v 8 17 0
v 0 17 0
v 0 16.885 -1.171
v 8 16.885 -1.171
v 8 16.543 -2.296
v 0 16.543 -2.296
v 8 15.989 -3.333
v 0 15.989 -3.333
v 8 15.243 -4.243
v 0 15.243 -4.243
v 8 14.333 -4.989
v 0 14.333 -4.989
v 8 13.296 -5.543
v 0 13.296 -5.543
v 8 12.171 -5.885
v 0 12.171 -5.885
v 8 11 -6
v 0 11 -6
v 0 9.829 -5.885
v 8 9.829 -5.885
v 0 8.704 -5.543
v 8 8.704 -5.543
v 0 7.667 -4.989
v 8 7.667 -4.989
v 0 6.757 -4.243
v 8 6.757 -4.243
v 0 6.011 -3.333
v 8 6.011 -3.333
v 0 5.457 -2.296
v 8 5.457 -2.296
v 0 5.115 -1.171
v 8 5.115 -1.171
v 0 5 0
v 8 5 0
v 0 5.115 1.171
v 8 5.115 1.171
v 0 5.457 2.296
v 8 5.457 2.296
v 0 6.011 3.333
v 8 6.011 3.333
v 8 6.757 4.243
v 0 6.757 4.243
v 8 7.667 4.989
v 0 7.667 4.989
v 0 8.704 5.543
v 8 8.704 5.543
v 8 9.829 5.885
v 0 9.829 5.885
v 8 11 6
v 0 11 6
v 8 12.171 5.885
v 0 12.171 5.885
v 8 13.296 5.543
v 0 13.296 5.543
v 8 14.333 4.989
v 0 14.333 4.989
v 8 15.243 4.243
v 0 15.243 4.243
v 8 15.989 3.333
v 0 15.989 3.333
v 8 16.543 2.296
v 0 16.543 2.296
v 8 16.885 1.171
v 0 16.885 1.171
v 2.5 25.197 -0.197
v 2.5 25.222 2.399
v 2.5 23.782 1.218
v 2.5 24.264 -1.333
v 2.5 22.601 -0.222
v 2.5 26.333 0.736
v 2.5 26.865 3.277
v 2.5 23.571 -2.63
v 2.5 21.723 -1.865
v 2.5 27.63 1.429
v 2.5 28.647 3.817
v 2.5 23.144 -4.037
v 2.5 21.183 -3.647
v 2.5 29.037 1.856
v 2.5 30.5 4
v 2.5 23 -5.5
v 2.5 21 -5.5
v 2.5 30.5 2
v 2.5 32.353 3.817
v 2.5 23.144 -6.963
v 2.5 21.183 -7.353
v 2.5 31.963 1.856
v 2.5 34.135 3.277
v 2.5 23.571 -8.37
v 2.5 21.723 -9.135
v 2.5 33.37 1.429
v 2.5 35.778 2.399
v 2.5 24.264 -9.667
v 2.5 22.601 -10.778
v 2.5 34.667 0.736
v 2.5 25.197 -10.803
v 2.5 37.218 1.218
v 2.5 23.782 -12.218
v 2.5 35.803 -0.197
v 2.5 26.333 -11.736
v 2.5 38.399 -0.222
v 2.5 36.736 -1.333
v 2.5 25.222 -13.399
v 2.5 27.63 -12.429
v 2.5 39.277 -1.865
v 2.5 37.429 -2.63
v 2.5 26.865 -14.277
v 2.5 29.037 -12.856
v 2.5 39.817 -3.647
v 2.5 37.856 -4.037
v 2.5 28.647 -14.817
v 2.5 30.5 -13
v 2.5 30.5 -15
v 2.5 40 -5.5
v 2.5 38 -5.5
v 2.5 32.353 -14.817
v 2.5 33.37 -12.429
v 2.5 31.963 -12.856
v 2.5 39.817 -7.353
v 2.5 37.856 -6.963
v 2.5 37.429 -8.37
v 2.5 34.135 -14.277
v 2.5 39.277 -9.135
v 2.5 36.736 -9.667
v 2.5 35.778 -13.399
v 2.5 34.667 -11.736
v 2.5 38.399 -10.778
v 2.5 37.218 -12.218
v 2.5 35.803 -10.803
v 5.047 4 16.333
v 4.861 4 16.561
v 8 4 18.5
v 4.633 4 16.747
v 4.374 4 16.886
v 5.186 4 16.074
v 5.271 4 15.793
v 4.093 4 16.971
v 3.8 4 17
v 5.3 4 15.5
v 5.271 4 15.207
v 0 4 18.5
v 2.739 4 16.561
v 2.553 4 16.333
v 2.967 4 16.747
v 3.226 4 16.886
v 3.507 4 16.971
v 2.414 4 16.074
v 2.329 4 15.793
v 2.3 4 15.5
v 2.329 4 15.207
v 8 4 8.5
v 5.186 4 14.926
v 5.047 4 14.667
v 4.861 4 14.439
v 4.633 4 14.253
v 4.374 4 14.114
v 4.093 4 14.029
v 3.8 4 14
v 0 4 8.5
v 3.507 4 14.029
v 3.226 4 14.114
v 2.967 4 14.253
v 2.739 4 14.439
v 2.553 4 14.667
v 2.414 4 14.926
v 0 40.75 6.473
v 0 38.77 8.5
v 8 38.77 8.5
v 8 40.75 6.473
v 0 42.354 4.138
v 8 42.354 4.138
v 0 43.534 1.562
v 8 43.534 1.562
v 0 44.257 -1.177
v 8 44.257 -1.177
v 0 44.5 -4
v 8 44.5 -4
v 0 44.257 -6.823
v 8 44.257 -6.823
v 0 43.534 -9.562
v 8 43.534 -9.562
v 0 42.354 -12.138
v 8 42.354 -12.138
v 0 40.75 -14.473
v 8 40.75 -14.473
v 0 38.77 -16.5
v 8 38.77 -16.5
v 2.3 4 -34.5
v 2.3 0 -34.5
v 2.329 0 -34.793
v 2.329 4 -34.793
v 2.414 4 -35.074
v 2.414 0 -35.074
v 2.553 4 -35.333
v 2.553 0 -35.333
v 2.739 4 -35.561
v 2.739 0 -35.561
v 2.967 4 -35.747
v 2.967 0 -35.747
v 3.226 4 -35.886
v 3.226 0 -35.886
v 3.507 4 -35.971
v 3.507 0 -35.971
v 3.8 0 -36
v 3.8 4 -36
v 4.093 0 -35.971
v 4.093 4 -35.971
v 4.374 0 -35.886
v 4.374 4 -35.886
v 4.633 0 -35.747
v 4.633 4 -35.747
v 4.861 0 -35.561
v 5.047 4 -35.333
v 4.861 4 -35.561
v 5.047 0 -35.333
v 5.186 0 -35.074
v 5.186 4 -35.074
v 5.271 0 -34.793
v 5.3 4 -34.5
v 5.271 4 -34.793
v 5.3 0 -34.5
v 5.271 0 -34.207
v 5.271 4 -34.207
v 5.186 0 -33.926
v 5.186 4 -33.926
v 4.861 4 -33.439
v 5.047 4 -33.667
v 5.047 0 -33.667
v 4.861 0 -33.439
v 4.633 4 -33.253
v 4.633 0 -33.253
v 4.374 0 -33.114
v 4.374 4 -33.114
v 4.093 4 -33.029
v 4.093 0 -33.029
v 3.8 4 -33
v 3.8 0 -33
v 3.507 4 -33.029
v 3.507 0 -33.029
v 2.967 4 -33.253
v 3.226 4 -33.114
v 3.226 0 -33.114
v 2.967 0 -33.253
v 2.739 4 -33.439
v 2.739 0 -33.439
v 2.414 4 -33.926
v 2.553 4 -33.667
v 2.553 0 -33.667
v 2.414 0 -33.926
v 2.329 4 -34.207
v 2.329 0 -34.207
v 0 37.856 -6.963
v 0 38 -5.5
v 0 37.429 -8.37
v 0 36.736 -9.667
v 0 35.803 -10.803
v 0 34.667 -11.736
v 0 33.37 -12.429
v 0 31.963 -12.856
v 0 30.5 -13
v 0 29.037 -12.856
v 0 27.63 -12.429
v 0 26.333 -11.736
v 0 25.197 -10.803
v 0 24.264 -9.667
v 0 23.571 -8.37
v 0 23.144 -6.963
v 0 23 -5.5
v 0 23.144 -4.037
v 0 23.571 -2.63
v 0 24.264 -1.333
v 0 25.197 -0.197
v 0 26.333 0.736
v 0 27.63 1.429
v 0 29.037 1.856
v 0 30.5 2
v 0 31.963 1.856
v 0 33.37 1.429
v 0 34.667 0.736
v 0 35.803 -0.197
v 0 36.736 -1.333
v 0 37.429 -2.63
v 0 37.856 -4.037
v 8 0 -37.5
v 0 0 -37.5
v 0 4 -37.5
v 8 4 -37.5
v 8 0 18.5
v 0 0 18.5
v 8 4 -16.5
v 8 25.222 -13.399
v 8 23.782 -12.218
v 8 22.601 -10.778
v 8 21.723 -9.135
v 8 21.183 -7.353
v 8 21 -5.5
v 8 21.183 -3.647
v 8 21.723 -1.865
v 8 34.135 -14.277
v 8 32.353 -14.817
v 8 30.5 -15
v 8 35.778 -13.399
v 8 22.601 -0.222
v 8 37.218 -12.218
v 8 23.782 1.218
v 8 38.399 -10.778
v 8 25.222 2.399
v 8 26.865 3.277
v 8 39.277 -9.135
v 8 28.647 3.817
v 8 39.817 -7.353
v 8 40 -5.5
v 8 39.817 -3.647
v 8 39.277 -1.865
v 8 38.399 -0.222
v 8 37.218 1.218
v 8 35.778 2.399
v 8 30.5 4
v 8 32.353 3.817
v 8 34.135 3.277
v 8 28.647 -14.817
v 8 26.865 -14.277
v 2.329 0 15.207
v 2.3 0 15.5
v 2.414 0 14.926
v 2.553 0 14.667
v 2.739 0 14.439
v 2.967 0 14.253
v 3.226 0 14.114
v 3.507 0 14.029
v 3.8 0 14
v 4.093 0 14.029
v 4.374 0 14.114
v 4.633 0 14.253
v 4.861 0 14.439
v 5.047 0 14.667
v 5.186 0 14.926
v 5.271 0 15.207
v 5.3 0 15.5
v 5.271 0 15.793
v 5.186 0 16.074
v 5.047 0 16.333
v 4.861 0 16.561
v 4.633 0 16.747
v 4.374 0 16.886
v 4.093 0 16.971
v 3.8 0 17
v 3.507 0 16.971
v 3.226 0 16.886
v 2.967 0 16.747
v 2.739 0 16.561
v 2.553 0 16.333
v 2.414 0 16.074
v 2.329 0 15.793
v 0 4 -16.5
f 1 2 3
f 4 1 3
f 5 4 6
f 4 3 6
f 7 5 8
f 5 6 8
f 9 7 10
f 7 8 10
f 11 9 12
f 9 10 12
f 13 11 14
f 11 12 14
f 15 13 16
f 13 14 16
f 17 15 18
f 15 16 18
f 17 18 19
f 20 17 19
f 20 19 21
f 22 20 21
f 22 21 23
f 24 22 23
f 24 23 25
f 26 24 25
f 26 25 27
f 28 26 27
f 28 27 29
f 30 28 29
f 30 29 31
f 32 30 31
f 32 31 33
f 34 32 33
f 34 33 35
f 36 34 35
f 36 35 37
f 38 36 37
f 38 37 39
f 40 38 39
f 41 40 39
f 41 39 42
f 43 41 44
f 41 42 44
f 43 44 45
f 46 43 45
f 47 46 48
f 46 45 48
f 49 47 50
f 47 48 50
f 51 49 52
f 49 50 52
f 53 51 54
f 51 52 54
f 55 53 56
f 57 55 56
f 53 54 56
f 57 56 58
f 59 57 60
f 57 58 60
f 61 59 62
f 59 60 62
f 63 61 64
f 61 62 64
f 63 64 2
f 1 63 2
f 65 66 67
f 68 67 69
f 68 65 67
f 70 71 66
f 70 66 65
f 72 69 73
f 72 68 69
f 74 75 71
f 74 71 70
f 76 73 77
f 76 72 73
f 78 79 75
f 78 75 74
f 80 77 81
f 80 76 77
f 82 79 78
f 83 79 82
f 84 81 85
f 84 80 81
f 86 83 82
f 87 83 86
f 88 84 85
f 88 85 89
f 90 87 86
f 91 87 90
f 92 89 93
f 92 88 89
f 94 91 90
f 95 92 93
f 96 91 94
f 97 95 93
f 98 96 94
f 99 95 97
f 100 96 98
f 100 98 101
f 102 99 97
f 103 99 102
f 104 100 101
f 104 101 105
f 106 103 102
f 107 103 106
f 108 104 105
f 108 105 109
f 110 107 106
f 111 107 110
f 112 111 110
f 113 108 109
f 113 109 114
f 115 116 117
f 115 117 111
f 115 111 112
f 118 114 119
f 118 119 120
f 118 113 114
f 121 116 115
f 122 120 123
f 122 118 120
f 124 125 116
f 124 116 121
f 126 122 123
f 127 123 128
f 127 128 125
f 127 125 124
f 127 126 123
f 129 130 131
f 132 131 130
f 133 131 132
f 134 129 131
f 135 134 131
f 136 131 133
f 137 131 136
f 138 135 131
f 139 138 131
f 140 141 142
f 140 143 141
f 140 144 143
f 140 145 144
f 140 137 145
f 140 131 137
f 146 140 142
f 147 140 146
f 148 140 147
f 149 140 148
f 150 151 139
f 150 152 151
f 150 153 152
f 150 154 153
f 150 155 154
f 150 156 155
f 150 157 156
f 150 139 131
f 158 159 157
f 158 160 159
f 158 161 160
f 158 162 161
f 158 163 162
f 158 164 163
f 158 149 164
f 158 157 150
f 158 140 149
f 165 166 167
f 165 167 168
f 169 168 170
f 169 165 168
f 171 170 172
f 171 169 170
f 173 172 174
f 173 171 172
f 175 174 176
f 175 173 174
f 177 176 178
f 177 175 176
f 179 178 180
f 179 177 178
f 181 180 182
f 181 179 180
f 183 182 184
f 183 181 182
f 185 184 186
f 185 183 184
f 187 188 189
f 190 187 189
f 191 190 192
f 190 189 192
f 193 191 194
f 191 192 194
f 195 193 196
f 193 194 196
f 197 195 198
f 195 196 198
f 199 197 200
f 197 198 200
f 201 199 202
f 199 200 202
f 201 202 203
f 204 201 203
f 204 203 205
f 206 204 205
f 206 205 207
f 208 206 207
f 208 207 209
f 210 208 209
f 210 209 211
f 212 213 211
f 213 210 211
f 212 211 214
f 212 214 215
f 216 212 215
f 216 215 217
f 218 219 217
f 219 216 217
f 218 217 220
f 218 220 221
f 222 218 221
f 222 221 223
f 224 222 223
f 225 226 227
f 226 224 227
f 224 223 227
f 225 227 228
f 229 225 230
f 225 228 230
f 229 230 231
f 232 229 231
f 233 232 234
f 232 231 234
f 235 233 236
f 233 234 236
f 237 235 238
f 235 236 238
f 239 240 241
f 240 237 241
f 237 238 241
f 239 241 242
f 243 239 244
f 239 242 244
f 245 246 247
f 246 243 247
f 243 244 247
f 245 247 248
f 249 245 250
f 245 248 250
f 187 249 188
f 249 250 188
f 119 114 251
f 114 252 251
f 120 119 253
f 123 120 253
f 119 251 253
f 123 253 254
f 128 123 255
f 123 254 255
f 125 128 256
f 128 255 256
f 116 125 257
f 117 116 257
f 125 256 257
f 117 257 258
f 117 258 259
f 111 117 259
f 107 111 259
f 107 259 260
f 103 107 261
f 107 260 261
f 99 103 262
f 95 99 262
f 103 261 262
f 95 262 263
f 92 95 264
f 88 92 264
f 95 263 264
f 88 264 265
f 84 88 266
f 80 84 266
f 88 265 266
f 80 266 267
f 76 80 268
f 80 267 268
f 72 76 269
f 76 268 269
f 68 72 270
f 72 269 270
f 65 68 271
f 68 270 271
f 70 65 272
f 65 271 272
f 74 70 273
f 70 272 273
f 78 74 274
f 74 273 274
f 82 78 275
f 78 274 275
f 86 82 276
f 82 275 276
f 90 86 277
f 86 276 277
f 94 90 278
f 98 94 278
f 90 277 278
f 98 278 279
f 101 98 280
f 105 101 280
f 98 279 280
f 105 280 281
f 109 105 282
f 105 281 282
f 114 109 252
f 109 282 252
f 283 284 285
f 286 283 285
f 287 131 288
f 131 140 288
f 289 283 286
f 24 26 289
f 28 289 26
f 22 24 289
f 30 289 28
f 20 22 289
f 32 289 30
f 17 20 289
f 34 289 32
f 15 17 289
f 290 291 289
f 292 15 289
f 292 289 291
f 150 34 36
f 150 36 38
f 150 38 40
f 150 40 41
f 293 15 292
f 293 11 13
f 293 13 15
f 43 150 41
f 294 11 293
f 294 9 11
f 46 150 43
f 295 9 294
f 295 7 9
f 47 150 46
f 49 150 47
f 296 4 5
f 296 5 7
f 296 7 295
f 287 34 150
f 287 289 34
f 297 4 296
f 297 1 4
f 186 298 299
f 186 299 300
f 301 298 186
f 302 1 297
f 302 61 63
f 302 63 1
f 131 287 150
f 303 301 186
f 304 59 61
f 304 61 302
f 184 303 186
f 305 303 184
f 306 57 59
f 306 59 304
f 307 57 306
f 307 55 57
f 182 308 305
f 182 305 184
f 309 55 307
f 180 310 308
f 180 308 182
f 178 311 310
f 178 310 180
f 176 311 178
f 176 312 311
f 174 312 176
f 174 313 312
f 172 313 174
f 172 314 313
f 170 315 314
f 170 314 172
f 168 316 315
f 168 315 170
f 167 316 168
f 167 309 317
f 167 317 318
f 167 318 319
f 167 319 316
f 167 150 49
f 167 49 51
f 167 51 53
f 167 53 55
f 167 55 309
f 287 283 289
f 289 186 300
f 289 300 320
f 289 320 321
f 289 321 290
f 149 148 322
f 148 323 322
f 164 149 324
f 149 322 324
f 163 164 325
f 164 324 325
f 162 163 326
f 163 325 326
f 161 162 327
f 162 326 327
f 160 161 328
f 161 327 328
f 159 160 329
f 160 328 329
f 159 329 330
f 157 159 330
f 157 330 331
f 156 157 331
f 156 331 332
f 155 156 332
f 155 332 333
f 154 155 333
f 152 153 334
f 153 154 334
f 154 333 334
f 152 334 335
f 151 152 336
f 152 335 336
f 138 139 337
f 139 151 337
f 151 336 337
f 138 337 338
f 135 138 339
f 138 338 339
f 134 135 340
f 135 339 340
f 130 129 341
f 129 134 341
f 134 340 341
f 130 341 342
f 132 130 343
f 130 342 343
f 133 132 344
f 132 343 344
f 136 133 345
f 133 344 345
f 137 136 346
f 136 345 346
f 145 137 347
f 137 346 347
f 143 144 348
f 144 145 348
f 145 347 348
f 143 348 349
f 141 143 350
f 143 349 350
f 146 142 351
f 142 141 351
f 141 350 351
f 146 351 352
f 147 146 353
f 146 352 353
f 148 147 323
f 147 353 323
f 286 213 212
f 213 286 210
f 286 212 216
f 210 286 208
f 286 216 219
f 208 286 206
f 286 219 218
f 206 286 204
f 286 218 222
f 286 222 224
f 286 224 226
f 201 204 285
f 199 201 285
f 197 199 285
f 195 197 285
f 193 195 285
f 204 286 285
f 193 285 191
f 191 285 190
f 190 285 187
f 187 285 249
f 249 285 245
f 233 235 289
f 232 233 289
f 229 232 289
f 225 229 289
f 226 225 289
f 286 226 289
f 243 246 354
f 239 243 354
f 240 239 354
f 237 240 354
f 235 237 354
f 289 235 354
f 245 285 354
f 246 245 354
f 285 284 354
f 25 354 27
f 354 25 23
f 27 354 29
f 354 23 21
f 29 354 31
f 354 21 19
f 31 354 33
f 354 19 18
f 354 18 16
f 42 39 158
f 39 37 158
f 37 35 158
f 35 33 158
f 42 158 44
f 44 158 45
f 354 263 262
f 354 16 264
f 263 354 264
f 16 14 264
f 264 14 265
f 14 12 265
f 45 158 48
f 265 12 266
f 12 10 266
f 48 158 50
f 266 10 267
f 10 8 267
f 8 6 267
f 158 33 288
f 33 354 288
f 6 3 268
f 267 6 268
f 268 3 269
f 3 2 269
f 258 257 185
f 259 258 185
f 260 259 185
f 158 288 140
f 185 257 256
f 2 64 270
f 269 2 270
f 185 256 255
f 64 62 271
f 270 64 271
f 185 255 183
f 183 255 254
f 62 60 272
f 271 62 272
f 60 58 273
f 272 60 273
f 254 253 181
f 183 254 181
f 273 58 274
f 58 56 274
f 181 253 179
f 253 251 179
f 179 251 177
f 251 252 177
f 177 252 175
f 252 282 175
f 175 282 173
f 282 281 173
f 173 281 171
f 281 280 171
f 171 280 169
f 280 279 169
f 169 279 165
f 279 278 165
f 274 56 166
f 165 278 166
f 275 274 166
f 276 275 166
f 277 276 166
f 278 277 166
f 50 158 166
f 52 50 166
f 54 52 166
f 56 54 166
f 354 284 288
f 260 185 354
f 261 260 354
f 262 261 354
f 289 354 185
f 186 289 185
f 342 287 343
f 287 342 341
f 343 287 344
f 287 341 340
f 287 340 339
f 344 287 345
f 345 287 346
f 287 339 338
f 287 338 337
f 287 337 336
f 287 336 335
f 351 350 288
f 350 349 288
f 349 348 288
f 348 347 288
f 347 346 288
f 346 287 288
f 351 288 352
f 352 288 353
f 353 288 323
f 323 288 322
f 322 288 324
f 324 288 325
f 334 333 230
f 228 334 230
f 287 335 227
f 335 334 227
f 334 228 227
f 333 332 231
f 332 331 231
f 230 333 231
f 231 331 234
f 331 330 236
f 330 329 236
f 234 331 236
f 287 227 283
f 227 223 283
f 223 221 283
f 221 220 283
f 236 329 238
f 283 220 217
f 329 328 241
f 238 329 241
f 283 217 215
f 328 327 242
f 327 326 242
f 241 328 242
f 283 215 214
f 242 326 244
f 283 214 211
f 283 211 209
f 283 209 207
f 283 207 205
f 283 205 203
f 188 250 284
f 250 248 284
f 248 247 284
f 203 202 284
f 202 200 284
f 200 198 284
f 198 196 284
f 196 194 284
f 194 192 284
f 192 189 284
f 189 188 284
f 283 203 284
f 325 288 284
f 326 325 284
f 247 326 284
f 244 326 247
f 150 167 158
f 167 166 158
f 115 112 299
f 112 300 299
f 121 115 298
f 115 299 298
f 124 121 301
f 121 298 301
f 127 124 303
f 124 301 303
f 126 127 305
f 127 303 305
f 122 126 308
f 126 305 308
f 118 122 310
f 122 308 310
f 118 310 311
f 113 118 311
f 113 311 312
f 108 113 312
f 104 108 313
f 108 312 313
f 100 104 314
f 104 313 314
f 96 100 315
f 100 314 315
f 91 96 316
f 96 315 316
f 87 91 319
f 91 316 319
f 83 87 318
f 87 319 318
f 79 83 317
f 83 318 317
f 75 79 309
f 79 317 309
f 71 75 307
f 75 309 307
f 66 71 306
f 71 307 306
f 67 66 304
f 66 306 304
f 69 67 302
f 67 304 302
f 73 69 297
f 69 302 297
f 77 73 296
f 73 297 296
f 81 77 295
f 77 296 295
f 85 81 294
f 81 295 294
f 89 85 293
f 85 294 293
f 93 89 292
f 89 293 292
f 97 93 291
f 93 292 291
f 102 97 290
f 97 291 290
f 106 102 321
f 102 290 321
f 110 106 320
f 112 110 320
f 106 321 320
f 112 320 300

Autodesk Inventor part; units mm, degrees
sketch "Sketch1" plane through (0, 0, 0) normal (1, 0, 0) x (0, 1, 0)
  circle A0 centre (11, 0) radius 6
  circle A1 centre (30.5, -5.5) radius 7.5
  line L0 (0, 29.7) -> (0, -48.7) projected
  line L1 (-8.9, 0) -> (53.4, 0) projected
  line L2 (4, 18.5) -> (0, 18.5)
  line L3 (0, -37.5) -> (4, -37.5)
  line L4 (0, 18.5) -> (0, -37.5)
  line L5 (4, 18.5) -> (4, 8.5)
  line L6 (4, -37.5) -> (4, -16.5)
  line L7 (4, -16.5) -> (38.7703, -16.5)
  line L8 (38.7703, 8.5) -> (4, 8.5)
  arc A2 (38.7703, -16.5) -> (38.7703, 8.5) centre (28, -4) ccw
  point P0 (0, 0)
  dimension "d0" = 12
  dimension "d1" = 15
  dimension "d2" = 11
  dimension "d3" = 30.5
  dimension "d4" = 0
  dimension "d5" = 5.5
  dimension "d7" = 56
  dimension "d8" = 4
  dimension "d9" = 4
  dimension "d10" = 0
  dimension "d11" = 0
  dimension "d13" = 11
  dimension "d17" = 16.5
  dimension "d18" = 18.5
  dimension "d19" = 4
  dimension "d20" = 28
  dimension "d21" = 8.5
extrude "Extrusion1" add sketch "Sketch1" along normal blind 8 contours L1 A1 A2 L7 L6 L3 L0 A0 | A0 L1 L0 L2 L5 L8 A2 A1
sketch "Sketch2" plane through (8, 0, 0) normal (1, 0, 0) x (0, 0, -1)
  circle A0 centre (5.5, 30.5) radius 9.5
  line L0 (-18.5, 0) -> (37.5, 0) projected
  line L1 (0, -8.9) -> (0, 53.4) projected
  point P0 (0, 0)
  dimension "d24" = 19
  dimension "d25" = 30.5
  dimension "d26" = 5.5
extrude "Extrusion2" cut sketch "Sketch2" against normal blind 5.5
sketch "Sketch3" plane through (0, 0, 0) normal (0, 1, 0) x (-1, 0, 0)
  circle A0 centre (-3.8, 15.5) radius 1.5
  line L0 (-8, 8.5) -> (-8, 18.5) projected
  line L1 (-9.6, 0) -> (1.6, 0) projected
  circle A1 centre (-3.8, -34.5) radius 1.5
  line L2 (-8, -37.5) -> (-8, -16.5) projected
  point P0 (0, 0)
  dimension "d29" = 3
  dimension "d30" = 4.2
  dimension "d31" = 15.5
  dimension "d32" = 3
  dimension "d33" = 4.2
  dimension "d34" = 50
extrude "Extrusion3" cut sketch "Sketch3" along normal blind 4
properties part number "support_arriere_gauche_2"
